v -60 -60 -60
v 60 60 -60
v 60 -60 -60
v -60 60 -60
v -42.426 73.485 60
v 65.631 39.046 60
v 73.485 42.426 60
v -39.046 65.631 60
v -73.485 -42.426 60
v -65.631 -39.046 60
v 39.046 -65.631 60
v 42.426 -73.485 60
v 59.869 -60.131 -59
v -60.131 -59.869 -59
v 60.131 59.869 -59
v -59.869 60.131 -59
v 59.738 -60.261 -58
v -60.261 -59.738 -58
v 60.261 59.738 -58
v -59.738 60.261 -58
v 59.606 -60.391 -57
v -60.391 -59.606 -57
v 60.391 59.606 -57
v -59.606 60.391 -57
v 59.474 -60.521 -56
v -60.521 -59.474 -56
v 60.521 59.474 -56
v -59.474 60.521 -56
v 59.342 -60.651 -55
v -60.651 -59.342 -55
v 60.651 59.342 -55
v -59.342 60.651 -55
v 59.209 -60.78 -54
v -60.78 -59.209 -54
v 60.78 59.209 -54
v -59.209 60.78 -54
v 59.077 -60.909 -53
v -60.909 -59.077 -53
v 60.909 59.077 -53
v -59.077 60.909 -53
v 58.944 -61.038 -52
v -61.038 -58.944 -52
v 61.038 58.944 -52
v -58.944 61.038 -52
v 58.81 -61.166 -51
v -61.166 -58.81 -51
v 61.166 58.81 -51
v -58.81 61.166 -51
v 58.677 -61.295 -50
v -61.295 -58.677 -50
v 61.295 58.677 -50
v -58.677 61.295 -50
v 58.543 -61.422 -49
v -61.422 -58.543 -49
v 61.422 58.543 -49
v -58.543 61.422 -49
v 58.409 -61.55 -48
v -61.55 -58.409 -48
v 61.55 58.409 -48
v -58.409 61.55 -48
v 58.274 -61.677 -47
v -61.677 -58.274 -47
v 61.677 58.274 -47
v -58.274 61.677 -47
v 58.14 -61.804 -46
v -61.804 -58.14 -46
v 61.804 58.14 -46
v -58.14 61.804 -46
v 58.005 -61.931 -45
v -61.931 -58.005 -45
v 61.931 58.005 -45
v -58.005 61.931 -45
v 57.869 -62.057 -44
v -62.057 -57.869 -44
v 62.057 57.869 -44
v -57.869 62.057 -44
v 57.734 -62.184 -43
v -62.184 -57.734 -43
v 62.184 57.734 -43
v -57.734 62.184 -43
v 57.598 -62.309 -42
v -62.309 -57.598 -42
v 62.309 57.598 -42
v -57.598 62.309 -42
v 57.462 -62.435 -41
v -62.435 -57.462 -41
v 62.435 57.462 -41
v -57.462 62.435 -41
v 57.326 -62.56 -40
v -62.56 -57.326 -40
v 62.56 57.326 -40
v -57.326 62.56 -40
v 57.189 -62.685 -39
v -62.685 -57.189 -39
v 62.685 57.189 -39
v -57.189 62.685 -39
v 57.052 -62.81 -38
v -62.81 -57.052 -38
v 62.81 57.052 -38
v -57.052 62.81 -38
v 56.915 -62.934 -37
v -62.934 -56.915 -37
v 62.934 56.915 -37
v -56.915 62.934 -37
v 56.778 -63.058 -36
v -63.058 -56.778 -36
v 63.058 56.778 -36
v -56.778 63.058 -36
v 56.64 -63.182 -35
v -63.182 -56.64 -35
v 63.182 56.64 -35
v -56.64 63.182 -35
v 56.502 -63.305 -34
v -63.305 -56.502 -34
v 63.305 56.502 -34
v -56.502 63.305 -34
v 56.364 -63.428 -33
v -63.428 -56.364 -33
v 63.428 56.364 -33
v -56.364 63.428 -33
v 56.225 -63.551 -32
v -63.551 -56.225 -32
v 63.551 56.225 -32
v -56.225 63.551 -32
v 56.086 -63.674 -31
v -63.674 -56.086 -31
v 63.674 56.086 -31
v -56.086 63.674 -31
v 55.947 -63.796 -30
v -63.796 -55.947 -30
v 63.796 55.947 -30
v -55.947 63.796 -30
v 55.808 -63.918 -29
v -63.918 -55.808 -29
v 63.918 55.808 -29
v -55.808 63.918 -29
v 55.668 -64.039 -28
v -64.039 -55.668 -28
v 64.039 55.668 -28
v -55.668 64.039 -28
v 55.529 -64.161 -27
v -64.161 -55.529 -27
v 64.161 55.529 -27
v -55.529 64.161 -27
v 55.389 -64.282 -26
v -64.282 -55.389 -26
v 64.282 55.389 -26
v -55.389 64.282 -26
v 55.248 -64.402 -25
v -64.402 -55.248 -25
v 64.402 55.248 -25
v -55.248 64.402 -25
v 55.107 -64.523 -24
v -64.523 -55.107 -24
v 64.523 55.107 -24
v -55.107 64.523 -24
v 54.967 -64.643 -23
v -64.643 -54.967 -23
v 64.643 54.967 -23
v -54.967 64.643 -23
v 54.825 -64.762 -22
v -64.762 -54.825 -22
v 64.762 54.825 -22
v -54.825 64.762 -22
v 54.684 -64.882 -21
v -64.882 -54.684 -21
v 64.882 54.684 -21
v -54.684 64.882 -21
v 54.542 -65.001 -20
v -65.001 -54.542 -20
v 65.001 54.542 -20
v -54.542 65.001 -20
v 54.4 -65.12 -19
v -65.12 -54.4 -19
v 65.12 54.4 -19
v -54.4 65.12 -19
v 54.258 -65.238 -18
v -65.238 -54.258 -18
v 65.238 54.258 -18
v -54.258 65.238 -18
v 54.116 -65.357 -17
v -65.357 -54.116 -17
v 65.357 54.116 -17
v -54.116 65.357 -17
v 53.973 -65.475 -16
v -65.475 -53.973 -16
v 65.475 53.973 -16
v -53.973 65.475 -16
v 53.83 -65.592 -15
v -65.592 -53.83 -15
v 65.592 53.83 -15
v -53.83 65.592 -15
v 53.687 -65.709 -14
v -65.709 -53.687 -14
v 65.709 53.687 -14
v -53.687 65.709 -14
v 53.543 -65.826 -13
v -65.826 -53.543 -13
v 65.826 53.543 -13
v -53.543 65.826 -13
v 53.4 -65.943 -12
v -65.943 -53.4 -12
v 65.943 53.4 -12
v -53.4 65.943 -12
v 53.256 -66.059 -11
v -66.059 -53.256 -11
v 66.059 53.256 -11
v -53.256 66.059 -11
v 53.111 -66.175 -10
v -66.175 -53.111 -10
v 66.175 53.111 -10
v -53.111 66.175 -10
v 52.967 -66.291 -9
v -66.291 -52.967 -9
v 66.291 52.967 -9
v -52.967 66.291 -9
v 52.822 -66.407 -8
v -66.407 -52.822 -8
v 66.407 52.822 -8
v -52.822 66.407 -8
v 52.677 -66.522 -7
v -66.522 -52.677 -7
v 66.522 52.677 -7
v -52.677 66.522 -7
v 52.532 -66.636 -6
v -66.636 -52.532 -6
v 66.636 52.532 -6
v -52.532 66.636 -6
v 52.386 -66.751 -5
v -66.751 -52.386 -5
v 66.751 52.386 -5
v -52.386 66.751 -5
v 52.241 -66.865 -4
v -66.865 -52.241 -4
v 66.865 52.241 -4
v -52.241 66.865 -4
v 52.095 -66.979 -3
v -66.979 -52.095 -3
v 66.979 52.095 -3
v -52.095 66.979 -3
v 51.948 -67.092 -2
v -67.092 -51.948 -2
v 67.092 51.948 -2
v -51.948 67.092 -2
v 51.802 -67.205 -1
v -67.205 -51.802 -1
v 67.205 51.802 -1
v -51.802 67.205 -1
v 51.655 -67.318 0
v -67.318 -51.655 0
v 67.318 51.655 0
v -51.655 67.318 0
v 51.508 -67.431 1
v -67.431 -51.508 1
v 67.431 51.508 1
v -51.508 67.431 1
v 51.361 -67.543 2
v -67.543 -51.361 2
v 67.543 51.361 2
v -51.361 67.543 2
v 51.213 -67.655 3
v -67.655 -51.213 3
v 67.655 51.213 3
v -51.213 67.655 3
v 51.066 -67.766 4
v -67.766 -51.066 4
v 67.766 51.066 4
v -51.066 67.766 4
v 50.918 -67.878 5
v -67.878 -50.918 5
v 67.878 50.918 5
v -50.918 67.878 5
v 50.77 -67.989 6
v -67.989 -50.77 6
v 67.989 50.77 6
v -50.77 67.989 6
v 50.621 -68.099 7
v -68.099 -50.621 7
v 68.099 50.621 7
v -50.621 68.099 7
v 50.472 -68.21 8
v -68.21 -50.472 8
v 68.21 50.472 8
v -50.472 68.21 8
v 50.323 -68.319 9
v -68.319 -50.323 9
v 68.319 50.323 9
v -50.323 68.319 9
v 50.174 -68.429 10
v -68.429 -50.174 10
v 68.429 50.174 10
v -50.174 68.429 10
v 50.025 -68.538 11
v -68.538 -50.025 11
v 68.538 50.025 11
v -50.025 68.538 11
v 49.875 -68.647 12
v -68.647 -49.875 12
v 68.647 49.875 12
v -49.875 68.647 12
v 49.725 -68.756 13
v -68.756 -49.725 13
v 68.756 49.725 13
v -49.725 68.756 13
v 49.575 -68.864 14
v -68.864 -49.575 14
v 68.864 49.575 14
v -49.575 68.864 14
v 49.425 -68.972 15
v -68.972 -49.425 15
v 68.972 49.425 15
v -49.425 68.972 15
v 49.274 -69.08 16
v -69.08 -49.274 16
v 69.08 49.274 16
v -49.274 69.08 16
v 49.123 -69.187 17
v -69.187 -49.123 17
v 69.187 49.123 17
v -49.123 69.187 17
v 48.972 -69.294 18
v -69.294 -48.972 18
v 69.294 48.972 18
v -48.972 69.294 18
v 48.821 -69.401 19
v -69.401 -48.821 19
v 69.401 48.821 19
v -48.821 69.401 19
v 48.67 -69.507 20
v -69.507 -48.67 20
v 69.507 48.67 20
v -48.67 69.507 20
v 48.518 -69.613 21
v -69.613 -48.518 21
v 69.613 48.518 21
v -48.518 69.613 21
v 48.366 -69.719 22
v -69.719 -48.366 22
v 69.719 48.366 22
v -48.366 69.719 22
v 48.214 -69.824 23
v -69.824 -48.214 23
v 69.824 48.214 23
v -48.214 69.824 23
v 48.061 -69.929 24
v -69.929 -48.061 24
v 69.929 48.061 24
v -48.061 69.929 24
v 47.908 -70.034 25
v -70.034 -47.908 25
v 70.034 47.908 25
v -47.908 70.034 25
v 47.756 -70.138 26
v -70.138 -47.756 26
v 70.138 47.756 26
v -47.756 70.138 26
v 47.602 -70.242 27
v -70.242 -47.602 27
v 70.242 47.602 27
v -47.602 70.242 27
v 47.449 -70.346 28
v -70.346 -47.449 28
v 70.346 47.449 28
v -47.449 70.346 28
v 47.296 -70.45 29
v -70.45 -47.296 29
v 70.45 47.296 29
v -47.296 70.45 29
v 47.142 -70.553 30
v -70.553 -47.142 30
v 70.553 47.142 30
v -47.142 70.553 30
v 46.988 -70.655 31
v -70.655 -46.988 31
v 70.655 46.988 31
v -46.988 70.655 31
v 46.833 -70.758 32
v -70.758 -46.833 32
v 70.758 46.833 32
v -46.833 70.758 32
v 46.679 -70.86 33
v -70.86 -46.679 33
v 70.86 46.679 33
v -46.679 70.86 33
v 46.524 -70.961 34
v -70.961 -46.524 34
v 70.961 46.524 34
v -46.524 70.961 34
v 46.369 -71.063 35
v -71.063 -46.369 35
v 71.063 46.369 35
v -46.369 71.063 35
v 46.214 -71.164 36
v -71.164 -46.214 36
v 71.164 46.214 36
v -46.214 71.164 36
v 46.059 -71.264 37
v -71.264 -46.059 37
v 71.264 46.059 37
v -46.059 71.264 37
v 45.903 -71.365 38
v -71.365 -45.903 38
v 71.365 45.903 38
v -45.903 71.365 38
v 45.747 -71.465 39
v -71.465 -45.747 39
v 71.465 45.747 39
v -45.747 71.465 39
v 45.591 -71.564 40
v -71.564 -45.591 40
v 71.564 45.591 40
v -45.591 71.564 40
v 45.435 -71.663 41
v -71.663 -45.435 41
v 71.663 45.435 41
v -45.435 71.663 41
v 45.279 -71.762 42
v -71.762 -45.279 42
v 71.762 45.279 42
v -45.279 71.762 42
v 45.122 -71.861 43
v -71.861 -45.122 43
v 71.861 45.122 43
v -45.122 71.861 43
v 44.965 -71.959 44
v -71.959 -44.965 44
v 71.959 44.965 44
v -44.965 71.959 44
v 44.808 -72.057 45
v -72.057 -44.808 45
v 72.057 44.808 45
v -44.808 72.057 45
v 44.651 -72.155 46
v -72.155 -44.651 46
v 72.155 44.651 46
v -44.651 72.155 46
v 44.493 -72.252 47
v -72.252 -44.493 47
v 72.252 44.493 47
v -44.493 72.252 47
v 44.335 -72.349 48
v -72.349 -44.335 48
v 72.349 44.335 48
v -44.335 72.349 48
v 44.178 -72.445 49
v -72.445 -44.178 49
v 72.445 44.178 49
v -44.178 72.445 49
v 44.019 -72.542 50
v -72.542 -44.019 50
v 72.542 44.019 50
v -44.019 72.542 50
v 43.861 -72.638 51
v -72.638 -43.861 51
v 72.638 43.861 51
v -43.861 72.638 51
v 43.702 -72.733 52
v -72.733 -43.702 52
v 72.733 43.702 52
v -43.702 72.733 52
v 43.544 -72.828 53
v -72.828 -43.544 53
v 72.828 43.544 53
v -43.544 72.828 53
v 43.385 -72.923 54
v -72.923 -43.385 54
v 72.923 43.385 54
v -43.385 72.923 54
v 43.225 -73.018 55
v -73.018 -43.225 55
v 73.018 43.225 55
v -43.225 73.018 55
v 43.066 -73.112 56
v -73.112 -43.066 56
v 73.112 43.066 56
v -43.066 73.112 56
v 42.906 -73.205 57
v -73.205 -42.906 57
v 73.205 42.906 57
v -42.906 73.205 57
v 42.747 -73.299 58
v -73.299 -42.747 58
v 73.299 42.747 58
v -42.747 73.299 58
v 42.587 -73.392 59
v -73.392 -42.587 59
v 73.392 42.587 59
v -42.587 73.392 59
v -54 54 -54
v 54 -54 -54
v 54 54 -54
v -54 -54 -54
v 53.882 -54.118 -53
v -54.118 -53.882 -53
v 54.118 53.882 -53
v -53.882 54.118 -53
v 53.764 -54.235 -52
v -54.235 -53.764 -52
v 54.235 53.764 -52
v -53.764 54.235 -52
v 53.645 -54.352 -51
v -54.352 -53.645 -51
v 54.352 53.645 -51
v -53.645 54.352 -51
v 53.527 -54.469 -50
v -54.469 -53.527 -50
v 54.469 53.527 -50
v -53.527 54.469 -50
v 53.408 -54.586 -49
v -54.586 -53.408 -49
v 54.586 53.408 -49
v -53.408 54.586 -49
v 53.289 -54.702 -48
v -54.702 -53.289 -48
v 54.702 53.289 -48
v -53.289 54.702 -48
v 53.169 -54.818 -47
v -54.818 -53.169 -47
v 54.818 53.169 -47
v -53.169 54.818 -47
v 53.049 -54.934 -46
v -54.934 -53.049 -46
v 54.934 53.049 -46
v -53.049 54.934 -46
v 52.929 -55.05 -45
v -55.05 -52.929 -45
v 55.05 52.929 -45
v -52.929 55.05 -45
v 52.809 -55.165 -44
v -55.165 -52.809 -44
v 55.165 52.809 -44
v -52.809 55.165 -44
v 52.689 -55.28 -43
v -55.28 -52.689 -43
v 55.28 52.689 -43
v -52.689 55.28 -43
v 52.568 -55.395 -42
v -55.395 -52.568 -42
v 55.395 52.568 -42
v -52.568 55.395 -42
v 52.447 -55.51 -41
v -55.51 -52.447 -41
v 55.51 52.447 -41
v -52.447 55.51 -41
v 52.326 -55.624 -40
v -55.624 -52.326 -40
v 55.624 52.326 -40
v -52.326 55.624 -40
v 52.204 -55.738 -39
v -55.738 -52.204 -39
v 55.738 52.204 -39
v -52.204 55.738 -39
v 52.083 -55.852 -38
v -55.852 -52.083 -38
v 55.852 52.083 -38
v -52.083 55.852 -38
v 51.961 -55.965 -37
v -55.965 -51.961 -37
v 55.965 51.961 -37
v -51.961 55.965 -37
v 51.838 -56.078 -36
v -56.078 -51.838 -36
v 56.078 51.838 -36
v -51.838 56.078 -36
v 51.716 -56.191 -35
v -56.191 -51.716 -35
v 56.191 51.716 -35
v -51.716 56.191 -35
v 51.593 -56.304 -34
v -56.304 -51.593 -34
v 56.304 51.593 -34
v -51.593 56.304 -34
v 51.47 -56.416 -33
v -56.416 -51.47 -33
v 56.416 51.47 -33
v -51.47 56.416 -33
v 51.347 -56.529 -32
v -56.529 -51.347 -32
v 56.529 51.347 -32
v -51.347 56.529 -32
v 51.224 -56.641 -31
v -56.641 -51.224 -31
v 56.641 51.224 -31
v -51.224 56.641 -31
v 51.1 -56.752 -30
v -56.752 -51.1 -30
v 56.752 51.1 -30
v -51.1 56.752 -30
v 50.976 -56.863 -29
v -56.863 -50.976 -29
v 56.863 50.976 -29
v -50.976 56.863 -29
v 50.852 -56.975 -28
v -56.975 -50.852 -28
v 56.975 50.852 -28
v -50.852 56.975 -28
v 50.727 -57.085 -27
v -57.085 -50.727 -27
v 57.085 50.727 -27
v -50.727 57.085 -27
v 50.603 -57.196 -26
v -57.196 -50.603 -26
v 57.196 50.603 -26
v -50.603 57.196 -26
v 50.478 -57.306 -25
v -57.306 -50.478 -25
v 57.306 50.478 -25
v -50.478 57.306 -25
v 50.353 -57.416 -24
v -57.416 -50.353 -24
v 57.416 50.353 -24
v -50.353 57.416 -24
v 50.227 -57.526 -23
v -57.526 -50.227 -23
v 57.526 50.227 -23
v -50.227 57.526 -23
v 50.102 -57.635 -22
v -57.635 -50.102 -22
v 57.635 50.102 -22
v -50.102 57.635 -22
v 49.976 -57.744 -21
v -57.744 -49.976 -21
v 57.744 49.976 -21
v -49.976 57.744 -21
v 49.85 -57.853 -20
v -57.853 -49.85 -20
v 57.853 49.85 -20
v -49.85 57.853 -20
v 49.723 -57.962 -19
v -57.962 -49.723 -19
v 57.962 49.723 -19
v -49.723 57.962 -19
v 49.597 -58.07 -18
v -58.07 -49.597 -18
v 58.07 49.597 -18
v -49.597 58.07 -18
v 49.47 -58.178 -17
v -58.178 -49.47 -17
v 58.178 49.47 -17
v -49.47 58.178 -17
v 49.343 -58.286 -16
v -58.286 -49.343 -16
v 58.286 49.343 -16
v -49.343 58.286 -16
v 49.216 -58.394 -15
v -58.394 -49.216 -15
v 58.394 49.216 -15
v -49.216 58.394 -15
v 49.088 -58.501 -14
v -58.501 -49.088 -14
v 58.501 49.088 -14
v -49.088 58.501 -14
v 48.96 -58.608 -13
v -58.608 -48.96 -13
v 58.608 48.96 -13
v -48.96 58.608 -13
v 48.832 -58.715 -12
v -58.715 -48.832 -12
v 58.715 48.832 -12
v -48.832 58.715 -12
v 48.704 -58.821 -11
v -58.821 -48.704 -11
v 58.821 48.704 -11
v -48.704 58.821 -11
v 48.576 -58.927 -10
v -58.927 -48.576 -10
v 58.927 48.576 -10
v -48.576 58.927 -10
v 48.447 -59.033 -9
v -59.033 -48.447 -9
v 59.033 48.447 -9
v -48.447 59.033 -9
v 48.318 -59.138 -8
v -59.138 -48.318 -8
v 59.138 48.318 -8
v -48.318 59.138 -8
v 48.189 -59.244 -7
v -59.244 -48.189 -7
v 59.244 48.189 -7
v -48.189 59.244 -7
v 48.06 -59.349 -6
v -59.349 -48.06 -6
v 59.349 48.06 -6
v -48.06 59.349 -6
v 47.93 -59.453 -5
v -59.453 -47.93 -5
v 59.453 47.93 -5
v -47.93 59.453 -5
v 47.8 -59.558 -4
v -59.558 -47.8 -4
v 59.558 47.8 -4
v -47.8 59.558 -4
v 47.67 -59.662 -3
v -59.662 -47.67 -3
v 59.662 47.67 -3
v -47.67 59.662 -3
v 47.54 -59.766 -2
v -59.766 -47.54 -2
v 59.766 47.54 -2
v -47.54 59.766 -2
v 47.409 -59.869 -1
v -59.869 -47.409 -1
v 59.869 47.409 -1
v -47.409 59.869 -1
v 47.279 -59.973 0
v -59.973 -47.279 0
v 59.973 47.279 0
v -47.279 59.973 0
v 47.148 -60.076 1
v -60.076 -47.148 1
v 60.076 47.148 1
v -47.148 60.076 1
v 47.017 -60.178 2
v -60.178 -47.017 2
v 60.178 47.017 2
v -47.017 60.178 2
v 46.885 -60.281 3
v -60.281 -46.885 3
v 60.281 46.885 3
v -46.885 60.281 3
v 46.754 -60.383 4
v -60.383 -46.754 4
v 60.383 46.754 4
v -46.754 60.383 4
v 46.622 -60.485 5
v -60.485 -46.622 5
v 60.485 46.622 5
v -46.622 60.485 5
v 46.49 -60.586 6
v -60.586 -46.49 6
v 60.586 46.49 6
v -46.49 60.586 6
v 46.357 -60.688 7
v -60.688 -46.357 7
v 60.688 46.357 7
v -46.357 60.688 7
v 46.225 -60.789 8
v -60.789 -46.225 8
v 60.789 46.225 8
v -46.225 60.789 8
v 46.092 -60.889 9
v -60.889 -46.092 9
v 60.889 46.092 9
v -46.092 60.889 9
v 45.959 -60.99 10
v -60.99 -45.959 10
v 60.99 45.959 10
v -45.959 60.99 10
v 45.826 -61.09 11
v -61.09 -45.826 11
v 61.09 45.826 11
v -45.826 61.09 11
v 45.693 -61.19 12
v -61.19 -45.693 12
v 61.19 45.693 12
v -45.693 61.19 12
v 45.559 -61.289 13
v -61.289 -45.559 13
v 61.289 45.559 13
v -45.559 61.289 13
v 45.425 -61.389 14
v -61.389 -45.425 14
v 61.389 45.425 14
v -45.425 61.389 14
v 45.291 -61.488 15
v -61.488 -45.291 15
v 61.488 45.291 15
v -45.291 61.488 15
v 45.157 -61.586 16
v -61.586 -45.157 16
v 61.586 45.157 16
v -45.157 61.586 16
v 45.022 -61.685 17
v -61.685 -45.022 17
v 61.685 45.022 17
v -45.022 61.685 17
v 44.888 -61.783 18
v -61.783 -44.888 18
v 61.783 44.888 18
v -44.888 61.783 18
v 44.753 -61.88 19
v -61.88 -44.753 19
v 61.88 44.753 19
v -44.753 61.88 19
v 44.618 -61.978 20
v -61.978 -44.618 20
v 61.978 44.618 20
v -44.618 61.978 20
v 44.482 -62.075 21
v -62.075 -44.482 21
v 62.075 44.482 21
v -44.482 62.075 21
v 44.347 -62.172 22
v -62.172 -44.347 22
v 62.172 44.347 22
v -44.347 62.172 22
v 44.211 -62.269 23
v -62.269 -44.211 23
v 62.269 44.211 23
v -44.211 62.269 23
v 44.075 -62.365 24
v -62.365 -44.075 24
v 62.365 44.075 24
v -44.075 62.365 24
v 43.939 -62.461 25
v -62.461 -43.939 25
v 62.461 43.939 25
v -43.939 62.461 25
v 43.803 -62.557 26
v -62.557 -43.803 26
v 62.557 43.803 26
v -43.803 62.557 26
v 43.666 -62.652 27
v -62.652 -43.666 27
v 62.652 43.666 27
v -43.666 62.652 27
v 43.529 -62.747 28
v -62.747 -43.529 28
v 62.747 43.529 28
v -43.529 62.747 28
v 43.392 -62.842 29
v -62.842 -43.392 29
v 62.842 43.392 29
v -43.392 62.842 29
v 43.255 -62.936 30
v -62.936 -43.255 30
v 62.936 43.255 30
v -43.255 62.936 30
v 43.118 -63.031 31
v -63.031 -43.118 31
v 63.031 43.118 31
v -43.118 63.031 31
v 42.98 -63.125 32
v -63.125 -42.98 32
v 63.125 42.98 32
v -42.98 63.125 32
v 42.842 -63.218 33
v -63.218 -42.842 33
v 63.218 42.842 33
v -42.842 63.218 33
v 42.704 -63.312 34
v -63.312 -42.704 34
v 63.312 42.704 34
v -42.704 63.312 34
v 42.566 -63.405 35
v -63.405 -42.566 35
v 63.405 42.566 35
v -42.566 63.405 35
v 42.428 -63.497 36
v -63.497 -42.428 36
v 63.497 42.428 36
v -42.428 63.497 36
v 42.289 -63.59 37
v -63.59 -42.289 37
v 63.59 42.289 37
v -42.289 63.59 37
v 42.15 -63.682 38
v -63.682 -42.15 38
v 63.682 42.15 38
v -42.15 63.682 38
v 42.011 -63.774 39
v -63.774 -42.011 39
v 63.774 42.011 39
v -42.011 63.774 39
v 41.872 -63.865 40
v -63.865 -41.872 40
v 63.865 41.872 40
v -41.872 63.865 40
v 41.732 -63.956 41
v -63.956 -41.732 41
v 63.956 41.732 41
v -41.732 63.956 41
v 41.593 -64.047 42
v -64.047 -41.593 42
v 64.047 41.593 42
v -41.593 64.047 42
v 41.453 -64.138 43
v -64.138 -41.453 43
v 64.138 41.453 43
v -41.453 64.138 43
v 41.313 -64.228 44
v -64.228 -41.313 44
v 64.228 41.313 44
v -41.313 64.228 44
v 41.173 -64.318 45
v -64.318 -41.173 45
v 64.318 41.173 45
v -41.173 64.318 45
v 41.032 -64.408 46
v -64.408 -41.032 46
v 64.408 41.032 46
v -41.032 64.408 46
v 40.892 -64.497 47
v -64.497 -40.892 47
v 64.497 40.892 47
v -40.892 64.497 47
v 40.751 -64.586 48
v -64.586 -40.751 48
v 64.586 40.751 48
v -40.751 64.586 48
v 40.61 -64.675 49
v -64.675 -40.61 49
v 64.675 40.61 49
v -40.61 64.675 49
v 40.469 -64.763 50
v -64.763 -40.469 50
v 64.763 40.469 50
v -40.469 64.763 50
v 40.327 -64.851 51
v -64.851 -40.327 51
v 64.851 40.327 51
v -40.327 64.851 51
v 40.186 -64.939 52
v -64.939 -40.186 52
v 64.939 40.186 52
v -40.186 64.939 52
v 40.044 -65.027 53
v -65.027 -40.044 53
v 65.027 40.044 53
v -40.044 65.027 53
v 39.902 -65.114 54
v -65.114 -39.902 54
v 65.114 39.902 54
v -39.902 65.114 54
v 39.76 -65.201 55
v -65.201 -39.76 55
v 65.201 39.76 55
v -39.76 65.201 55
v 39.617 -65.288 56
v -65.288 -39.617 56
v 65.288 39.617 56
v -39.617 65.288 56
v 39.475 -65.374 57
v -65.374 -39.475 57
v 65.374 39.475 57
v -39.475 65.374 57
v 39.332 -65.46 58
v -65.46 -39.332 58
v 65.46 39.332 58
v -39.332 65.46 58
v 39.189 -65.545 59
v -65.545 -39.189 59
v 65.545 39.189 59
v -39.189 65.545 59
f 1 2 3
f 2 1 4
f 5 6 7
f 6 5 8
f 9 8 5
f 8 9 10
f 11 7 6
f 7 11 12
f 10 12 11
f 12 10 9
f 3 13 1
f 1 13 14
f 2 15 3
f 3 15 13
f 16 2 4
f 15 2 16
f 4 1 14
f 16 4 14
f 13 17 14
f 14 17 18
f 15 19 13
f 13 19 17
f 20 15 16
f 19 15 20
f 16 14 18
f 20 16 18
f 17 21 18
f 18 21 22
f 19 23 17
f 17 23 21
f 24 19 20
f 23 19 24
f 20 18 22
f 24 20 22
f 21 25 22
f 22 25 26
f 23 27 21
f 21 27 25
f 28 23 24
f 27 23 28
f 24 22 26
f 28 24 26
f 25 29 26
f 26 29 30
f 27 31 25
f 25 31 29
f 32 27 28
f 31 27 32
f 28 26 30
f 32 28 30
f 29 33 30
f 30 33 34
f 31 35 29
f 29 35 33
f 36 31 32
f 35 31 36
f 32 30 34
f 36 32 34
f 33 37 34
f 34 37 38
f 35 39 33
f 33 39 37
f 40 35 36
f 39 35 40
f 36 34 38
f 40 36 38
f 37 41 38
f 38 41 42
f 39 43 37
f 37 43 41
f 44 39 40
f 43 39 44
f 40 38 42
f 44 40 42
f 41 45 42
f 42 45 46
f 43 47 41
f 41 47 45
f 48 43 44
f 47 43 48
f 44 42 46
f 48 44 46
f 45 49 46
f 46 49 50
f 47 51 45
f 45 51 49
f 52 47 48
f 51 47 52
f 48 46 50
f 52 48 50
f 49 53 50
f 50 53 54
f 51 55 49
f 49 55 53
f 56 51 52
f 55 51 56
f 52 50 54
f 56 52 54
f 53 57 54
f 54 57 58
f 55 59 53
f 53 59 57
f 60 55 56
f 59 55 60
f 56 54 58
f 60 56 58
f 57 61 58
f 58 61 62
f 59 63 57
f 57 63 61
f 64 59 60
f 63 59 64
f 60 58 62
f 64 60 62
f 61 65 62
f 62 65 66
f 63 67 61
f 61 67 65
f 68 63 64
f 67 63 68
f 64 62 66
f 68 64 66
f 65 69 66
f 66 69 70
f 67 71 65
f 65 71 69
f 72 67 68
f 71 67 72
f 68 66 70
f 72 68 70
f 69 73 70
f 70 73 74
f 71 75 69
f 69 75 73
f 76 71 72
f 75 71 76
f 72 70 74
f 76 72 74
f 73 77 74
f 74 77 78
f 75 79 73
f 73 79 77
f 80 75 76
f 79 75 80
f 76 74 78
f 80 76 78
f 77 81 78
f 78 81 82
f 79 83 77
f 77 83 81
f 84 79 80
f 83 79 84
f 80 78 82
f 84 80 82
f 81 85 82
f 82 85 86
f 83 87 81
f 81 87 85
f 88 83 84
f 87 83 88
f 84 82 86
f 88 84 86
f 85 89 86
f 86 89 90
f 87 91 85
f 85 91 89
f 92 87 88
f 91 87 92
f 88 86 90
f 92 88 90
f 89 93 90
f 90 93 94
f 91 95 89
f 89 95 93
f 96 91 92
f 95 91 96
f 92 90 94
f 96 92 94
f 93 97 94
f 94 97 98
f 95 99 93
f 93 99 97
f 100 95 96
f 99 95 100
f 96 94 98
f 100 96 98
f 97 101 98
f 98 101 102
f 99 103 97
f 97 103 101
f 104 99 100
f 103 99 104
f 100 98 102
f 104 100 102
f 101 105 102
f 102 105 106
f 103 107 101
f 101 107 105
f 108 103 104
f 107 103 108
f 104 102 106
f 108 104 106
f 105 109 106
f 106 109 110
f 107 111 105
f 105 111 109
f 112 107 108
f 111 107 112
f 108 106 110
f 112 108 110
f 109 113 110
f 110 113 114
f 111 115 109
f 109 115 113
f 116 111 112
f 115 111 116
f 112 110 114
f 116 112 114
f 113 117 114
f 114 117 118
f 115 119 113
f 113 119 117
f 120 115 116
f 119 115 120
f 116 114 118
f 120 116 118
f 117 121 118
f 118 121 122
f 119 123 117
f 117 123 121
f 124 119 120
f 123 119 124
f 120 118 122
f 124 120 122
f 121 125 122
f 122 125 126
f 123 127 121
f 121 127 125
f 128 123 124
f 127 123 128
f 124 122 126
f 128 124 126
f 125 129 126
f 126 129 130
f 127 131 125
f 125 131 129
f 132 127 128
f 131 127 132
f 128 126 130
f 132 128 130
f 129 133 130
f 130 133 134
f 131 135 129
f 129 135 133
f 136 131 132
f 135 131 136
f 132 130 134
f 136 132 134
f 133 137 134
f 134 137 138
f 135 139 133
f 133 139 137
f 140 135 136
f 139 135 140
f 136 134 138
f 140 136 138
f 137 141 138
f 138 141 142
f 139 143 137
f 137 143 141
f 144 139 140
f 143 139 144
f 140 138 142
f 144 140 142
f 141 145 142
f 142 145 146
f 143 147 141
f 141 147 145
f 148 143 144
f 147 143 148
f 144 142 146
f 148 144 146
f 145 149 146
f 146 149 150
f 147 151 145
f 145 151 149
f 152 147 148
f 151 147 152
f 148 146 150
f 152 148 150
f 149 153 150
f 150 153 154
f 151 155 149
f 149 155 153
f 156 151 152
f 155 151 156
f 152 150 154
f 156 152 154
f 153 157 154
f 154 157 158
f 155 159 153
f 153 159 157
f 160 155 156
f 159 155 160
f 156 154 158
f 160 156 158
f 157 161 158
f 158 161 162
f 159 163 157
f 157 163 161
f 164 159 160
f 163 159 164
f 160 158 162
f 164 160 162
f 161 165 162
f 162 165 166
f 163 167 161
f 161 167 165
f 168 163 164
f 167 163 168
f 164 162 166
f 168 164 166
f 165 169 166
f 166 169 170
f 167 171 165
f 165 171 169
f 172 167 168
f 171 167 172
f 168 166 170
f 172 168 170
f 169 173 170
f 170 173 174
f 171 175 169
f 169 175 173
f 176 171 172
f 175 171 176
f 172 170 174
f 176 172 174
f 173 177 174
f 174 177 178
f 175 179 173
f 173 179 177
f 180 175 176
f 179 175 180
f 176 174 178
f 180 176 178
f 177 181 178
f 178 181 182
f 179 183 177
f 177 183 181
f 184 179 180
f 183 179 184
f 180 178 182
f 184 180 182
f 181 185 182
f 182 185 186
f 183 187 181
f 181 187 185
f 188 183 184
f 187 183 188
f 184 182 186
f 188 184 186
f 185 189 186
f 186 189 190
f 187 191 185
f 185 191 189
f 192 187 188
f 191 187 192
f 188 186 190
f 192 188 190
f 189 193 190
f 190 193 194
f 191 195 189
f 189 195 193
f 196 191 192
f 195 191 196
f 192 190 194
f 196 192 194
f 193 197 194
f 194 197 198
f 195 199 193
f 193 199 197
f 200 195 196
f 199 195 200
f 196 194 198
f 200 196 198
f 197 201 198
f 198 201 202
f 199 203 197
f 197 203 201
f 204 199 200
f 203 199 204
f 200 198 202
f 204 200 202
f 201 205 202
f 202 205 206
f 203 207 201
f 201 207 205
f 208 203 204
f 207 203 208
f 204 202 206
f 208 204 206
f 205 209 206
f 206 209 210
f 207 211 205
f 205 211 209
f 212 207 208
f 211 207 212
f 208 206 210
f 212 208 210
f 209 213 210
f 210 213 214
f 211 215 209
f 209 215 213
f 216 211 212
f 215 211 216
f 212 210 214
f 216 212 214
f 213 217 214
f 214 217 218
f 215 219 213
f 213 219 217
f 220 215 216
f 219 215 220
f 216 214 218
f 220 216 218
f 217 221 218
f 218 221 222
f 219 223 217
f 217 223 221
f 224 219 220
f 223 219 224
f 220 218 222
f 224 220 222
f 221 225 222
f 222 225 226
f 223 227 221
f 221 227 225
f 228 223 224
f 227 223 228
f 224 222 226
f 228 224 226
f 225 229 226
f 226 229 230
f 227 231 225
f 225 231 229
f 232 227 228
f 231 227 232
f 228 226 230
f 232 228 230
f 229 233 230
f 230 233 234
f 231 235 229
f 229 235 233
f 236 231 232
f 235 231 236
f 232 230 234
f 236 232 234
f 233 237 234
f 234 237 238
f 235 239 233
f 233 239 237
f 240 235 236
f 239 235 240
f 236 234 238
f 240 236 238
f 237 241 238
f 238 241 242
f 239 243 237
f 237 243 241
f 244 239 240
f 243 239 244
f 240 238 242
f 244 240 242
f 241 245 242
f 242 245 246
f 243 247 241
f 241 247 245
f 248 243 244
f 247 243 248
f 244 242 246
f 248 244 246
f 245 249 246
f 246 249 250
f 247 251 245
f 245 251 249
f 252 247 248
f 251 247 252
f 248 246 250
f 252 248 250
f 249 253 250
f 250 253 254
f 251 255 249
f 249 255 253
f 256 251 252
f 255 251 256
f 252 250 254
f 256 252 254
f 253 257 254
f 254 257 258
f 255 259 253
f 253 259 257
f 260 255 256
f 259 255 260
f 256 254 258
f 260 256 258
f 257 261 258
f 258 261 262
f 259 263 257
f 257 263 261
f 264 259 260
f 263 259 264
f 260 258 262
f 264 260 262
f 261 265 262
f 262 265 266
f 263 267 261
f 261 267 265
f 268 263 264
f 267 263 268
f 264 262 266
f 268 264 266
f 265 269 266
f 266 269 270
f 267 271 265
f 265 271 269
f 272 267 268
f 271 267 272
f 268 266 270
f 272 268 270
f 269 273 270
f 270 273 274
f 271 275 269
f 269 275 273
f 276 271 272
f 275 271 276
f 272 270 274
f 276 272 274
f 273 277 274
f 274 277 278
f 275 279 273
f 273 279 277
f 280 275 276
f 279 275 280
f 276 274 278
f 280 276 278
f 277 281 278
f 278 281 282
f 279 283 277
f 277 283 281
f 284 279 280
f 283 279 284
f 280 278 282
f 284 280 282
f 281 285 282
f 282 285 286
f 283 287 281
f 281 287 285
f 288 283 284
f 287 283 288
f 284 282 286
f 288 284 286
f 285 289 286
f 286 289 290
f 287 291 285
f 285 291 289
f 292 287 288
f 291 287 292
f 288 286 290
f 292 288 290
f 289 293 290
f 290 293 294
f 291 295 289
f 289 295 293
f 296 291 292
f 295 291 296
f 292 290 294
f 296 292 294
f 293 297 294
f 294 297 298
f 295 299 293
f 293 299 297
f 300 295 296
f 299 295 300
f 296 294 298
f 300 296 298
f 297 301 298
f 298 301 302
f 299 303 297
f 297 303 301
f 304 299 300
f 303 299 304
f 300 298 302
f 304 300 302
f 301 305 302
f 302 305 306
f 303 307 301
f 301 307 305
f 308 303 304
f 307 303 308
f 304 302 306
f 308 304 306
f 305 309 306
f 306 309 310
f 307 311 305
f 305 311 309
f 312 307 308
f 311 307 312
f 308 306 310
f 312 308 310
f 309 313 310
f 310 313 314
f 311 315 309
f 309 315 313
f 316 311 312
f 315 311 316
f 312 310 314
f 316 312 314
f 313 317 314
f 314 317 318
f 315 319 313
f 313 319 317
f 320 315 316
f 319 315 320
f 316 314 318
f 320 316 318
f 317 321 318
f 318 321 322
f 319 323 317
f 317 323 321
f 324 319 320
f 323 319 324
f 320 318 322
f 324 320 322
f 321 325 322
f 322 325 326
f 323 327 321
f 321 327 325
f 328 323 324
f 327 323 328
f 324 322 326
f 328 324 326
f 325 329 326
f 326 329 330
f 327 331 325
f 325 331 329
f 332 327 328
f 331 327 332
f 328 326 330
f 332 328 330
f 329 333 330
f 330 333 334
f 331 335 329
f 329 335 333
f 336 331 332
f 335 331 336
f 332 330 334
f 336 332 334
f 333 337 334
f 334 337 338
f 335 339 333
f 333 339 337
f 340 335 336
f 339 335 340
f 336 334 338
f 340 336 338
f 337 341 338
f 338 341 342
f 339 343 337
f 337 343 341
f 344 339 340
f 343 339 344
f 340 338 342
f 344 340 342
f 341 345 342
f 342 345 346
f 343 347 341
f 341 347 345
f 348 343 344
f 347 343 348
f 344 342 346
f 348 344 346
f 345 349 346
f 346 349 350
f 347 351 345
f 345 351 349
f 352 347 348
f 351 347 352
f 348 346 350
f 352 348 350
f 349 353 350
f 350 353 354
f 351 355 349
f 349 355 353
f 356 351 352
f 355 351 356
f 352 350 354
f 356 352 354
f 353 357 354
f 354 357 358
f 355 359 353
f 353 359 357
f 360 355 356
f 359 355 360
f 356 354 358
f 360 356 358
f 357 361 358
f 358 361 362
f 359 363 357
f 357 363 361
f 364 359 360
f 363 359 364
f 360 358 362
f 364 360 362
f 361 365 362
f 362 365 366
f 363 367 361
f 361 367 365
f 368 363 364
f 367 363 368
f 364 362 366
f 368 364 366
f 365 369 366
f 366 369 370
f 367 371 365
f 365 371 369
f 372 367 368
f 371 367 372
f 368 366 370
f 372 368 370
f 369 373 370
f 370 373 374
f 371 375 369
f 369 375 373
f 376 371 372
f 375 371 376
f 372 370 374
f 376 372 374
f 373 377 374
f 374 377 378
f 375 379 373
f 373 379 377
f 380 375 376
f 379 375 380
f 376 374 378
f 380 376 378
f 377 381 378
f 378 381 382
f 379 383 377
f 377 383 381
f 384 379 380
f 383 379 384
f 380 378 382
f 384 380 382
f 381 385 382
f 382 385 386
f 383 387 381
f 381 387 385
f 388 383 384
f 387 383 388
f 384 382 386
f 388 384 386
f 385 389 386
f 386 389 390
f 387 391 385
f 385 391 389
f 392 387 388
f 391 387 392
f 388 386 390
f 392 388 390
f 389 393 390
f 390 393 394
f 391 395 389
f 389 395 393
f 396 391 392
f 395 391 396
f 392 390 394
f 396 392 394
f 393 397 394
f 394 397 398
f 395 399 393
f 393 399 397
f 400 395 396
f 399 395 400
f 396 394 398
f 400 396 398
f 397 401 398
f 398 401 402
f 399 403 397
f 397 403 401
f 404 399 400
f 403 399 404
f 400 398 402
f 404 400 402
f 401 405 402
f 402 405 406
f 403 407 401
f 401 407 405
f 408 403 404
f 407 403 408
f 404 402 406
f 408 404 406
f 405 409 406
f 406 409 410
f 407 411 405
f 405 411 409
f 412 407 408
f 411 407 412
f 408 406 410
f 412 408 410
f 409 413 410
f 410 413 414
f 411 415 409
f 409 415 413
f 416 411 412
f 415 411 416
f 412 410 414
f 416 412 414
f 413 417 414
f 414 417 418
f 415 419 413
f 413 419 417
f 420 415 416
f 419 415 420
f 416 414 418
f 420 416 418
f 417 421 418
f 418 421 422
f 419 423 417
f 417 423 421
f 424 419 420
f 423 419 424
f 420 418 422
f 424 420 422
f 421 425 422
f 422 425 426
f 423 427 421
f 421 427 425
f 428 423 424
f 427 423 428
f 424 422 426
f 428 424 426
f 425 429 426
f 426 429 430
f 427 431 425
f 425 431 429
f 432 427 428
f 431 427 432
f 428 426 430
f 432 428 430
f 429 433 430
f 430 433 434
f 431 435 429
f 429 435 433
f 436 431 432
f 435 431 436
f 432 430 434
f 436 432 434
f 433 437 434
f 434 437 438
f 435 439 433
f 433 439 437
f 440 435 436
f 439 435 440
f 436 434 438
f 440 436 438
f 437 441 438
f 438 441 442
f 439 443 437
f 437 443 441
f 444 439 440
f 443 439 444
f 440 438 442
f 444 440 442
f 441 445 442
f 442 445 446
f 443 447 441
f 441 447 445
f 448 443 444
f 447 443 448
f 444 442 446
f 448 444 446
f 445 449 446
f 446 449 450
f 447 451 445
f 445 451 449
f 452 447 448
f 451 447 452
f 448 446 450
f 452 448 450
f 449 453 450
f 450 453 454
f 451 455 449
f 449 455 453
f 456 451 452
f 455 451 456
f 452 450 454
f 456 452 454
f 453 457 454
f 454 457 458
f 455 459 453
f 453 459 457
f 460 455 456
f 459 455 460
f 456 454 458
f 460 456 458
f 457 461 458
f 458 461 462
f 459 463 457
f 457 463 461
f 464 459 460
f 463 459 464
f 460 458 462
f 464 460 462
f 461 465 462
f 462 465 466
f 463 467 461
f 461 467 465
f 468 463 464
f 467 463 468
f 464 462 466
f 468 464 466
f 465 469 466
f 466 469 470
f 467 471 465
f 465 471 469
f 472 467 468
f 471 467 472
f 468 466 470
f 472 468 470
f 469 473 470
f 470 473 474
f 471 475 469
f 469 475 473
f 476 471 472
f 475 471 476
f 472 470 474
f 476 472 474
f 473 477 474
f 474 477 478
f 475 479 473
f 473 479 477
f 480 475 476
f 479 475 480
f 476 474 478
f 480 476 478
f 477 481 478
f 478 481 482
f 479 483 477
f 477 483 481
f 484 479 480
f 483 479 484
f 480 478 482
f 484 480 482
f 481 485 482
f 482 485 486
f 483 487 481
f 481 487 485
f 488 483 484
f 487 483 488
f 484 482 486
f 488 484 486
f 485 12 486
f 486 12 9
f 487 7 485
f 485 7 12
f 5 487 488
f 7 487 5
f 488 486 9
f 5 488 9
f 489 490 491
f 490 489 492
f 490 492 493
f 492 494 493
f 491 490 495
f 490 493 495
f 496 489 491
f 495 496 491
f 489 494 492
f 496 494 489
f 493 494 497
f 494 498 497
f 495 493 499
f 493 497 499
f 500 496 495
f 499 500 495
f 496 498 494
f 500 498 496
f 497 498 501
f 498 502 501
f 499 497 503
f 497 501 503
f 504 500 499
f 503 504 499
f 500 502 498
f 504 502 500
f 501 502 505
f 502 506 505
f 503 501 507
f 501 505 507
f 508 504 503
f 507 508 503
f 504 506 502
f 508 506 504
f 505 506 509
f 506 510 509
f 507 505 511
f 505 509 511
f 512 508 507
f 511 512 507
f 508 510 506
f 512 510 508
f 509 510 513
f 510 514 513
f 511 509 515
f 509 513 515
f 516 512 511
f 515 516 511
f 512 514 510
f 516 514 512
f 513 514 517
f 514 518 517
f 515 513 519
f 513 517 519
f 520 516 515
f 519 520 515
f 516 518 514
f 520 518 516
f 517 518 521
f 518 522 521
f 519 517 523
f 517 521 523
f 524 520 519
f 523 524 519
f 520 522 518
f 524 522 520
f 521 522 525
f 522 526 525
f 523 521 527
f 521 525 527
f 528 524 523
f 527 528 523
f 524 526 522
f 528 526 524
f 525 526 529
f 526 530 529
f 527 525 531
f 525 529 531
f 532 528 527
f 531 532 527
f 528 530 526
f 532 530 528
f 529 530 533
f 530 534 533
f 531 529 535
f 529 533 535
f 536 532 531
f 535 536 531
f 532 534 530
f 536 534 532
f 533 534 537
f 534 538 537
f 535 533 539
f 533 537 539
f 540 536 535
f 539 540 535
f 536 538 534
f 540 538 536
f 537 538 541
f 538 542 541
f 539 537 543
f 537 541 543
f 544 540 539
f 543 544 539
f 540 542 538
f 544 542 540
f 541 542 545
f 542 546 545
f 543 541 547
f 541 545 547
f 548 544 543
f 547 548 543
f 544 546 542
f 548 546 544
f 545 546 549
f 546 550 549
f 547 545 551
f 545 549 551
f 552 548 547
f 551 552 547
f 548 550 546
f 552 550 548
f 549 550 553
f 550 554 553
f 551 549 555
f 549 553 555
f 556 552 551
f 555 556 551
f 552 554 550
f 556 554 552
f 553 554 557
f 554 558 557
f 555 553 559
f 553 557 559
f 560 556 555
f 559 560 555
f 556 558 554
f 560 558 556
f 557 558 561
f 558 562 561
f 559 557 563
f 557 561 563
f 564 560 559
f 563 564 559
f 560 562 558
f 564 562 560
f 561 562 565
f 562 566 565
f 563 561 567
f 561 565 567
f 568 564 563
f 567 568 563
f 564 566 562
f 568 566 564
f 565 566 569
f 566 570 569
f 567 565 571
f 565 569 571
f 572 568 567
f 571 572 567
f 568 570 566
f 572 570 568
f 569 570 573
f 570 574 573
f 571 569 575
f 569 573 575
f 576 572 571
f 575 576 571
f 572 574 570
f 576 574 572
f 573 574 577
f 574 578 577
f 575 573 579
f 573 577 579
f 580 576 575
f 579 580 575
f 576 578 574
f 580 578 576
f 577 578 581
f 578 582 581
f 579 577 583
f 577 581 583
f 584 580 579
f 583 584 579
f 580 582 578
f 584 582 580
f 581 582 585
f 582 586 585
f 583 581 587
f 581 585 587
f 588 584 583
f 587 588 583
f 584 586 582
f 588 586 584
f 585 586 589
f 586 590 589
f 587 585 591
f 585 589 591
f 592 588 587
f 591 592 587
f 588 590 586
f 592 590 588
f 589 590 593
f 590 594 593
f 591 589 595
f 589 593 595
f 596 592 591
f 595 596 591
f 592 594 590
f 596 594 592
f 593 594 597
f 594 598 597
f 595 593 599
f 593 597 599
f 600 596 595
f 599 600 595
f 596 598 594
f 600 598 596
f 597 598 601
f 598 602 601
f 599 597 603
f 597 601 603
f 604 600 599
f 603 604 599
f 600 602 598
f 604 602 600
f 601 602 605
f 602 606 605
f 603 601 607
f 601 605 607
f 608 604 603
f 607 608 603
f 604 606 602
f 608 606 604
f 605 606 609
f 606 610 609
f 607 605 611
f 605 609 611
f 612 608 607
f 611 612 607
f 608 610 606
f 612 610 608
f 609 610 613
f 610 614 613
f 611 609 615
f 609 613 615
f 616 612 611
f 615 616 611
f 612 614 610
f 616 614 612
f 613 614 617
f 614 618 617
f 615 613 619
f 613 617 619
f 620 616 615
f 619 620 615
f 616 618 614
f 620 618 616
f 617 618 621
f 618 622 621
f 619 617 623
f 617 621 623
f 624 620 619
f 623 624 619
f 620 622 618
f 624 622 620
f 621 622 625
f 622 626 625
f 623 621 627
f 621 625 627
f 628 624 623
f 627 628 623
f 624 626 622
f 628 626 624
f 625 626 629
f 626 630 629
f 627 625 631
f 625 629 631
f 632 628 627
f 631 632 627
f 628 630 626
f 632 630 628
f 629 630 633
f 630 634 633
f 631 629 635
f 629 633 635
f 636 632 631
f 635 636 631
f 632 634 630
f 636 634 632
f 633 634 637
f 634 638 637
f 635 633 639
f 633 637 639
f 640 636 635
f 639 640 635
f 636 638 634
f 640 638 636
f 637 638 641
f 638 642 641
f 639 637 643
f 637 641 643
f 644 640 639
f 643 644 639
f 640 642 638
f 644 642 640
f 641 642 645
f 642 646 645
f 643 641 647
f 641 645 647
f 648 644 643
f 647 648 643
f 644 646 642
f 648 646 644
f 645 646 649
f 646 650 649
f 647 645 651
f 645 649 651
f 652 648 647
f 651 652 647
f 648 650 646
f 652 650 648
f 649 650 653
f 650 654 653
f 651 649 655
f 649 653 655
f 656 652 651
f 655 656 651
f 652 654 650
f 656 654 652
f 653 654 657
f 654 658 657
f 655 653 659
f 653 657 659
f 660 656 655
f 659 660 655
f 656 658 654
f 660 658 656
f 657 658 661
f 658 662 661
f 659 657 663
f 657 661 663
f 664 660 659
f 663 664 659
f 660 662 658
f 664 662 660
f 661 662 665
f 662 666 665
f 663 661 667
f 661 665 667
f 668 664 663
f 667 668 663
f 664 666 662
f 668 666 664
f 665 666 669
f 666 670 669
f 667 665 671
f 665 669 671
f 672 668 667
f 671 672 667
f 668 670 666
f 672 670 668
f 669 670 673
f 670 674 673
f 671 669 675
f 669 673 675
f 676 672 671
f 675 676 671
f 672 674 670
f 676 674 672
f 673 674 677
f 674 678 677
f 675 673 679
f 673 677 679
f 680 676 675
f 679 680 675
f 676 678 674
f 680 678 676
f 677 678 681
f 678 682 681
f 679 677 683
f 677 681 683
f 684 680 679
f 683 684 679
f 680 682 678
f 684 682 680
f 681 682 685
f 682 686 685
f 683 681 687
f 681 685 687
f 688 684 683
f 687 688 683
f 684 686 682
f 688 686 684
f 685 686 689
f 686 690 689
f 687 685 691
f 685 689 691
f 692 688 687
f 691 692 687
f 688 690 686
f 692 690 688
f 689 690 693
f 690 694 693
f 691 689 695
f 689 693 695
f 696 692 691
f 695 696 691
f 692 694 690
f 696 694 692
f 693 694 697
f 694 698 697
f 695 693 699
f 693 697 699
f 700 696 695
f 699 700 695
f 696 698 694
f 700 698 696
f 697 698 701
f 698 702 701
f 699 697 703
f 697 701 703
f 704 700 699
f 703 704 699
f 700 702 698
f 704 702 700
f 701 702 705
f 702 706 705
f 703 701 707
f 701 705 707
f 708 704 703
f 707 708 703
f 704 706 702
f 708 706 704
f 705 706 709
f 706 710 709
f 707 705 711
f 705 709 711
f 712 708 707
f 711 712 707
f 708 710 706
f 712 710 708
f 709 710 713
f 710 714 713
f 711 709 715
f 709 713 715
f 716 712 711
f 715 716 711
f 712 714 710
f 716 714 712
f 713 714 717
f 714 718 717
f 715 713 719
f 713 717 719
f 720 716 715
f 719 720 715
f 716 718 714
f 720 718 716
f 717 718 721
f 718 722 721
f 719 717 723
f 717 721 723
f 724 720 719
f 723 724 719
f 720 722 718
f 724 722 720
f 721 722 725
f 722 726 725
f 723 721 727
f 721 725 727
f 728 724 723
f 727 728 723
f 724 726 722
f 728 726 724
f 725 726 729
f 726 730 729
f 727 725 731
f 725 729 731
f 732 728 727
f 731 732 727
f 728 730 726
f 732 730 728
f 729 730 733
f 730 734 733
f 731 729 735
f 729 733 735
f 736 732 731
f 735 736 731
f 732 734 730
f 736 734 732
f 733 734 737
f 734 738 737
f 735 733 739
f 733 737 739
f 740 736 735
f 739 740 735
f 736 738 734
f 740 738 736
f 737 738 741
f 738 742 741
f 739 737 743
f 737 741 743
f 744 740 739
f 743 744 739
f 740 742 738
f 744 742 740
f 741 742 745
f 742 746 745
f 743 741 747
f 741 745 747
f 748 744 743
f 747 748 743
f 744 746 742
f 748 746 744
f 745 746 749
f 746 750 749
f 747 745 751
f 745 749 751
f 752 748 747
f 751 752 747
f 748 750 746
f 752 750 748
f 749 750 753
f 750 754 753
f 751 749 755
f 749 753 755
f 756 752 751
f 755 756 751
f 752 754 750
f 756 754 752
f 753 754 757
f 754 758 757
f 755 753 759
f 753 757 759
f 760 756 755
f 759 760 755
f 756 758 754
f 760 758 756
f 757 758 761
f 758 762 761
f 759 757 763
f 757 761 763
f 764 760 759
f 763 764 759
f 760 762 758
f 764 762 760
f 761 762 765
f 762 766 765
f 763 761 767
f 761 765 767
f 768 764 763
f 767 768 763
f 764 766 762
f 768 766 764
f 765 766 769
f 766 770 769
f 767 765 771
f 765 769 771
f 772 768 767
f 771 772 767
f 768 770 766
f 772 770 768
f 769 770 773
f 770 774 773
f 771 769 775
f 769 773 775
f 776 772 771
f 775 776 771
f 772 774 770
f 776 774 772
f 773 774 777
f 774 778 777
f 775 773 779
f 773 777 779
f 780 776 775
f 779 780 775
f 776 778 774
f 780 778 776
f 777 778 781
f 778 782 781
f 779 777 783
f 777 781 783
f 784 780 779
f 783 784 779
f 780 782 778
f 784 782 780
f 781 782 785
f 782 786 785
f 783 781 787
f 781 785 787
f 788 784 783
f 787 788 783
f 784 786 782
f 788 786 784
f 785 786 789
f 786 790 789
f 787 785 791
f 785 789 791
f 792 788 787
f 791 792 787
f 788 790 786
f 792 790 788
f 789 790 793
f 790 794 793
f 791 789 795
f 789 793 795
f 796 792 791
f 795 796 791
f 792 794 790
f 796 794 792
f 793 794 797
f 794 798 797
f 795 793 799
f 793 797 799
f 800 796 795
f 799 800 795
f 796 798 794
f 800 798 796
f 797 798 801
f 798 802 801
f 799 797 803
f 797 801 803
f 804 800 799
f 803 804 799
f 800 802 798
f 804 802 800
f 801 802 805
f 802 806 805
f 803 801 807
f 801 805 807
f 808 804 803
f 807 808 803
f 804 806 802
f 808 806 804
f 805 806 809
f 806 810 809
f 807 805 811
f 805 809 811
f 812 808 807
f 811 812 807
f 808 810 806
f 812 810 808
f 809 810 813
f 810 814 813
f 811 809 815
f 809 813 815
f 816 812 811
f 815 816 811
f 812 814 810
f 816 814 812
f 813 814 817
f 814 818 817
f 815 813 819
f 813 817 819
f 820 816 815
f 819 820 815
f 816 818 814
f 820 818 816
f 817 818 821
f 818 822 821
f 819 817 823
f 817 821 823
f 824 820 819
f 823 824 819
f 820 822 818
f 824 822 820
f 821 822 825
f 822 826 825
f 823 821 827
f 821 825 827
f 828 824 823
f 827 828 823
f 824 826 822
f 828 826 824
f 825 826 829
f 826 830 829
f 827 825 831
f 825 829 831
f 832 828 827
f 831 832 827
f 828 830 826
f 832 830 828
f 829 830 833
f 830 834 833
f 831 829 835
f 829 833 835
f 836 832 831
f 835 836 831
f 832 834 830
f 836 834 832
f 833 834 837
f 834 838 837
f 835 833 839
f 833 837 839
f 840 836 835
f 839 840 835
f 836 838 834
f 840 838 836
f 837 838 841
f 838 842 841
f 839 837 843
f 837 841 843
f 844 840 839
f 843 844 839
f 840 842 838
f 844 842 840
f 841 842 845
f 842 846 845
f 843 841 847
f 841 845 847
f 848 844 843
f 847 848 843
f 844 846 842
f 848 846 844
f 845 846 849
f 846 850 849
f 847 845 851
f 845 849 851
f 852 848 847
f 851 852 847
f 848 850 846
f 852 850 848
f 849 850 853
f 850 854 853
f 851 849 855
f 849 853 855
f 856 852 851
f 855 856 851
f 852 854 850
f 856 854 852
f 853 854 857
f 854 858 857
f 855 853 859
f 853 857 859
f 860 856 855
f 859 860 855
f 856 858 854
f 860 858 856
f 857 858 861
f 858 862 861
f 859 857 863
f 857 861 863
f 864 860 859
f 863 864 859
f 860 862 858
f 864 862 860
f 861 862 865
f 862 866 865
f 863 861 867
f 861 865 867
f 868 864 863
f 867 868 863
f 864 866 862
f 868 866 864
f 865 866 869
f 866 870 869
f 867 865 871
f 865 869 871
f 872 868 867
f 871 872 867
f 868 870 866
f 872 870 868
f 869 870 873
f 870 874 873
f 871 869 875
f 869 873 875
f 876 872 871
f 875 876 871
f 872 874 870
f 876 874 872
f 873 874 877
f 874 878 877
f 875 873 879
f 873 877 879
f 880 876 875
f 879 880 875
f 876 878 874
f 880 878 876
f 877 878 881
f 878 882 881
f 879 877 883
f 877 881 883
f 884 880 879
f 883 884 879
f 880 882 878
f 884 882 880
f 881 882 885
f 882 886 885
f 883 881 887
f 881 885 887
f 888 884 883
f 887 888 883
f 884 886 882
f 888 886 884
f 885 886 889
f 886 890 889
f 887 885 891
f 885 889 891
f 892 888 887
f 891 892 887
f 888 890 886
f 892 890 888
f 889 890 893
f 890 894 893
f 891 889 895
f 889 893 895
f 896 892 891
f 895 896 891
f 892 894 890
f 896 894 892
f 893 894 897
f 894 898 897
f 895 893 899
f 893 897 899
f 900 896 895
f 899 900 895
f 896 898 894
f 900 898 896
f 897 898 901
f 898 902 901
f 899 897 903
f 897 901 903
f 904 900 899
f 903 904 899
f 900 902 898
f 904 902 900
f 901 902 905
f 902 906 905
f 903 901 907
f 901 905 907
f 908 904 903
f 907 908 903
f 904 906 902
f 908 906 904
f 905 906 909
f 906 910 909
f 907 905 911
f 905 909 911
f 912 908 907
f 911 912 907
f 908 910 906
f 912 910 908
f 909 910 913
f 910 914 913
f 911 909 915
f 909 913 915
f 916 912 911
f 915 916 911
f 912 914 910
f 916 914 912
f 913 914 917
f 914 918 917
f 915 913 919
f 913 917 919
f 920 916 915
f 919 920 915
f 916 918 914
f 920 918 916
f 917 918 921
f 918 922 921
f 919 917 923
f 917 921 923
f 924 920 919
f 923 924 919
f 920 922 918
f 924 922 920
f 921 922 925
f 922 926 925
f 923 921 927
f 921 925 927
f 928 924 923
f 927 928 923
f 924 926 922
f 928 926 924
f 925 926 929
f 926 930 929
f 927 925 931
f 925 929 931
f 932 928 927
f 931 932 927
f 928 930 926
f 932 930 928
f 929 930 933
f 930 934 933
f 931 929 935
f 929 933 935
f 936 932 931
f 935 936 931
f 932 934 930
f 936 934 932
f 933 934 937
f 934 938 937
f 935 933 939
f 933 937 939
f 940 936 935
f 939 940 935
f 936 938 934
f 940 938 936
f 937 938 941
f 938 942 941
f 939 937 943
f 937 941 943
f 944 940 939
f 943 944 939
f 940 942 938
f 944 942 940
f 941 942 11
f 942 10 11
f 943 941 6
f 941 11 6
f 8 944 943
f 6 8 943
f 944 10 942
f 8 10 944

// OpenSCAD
boxHeight = 120;
boxSize = 120;
thickness = 6; // [4:20]
rotation = 15; // [15:45]

difference() {
    linear_extrude(height=boxHeight, center=true, twist=rotation, slices=boxHeight)
    square(boxSize, center=true);

    translate([0, 0, thickness])
    linear_extrude(height=boxHeight, center=true, twist=rotation, slices=boxHeight)
    square(boxSize-(2*thickness), center=true);
}
